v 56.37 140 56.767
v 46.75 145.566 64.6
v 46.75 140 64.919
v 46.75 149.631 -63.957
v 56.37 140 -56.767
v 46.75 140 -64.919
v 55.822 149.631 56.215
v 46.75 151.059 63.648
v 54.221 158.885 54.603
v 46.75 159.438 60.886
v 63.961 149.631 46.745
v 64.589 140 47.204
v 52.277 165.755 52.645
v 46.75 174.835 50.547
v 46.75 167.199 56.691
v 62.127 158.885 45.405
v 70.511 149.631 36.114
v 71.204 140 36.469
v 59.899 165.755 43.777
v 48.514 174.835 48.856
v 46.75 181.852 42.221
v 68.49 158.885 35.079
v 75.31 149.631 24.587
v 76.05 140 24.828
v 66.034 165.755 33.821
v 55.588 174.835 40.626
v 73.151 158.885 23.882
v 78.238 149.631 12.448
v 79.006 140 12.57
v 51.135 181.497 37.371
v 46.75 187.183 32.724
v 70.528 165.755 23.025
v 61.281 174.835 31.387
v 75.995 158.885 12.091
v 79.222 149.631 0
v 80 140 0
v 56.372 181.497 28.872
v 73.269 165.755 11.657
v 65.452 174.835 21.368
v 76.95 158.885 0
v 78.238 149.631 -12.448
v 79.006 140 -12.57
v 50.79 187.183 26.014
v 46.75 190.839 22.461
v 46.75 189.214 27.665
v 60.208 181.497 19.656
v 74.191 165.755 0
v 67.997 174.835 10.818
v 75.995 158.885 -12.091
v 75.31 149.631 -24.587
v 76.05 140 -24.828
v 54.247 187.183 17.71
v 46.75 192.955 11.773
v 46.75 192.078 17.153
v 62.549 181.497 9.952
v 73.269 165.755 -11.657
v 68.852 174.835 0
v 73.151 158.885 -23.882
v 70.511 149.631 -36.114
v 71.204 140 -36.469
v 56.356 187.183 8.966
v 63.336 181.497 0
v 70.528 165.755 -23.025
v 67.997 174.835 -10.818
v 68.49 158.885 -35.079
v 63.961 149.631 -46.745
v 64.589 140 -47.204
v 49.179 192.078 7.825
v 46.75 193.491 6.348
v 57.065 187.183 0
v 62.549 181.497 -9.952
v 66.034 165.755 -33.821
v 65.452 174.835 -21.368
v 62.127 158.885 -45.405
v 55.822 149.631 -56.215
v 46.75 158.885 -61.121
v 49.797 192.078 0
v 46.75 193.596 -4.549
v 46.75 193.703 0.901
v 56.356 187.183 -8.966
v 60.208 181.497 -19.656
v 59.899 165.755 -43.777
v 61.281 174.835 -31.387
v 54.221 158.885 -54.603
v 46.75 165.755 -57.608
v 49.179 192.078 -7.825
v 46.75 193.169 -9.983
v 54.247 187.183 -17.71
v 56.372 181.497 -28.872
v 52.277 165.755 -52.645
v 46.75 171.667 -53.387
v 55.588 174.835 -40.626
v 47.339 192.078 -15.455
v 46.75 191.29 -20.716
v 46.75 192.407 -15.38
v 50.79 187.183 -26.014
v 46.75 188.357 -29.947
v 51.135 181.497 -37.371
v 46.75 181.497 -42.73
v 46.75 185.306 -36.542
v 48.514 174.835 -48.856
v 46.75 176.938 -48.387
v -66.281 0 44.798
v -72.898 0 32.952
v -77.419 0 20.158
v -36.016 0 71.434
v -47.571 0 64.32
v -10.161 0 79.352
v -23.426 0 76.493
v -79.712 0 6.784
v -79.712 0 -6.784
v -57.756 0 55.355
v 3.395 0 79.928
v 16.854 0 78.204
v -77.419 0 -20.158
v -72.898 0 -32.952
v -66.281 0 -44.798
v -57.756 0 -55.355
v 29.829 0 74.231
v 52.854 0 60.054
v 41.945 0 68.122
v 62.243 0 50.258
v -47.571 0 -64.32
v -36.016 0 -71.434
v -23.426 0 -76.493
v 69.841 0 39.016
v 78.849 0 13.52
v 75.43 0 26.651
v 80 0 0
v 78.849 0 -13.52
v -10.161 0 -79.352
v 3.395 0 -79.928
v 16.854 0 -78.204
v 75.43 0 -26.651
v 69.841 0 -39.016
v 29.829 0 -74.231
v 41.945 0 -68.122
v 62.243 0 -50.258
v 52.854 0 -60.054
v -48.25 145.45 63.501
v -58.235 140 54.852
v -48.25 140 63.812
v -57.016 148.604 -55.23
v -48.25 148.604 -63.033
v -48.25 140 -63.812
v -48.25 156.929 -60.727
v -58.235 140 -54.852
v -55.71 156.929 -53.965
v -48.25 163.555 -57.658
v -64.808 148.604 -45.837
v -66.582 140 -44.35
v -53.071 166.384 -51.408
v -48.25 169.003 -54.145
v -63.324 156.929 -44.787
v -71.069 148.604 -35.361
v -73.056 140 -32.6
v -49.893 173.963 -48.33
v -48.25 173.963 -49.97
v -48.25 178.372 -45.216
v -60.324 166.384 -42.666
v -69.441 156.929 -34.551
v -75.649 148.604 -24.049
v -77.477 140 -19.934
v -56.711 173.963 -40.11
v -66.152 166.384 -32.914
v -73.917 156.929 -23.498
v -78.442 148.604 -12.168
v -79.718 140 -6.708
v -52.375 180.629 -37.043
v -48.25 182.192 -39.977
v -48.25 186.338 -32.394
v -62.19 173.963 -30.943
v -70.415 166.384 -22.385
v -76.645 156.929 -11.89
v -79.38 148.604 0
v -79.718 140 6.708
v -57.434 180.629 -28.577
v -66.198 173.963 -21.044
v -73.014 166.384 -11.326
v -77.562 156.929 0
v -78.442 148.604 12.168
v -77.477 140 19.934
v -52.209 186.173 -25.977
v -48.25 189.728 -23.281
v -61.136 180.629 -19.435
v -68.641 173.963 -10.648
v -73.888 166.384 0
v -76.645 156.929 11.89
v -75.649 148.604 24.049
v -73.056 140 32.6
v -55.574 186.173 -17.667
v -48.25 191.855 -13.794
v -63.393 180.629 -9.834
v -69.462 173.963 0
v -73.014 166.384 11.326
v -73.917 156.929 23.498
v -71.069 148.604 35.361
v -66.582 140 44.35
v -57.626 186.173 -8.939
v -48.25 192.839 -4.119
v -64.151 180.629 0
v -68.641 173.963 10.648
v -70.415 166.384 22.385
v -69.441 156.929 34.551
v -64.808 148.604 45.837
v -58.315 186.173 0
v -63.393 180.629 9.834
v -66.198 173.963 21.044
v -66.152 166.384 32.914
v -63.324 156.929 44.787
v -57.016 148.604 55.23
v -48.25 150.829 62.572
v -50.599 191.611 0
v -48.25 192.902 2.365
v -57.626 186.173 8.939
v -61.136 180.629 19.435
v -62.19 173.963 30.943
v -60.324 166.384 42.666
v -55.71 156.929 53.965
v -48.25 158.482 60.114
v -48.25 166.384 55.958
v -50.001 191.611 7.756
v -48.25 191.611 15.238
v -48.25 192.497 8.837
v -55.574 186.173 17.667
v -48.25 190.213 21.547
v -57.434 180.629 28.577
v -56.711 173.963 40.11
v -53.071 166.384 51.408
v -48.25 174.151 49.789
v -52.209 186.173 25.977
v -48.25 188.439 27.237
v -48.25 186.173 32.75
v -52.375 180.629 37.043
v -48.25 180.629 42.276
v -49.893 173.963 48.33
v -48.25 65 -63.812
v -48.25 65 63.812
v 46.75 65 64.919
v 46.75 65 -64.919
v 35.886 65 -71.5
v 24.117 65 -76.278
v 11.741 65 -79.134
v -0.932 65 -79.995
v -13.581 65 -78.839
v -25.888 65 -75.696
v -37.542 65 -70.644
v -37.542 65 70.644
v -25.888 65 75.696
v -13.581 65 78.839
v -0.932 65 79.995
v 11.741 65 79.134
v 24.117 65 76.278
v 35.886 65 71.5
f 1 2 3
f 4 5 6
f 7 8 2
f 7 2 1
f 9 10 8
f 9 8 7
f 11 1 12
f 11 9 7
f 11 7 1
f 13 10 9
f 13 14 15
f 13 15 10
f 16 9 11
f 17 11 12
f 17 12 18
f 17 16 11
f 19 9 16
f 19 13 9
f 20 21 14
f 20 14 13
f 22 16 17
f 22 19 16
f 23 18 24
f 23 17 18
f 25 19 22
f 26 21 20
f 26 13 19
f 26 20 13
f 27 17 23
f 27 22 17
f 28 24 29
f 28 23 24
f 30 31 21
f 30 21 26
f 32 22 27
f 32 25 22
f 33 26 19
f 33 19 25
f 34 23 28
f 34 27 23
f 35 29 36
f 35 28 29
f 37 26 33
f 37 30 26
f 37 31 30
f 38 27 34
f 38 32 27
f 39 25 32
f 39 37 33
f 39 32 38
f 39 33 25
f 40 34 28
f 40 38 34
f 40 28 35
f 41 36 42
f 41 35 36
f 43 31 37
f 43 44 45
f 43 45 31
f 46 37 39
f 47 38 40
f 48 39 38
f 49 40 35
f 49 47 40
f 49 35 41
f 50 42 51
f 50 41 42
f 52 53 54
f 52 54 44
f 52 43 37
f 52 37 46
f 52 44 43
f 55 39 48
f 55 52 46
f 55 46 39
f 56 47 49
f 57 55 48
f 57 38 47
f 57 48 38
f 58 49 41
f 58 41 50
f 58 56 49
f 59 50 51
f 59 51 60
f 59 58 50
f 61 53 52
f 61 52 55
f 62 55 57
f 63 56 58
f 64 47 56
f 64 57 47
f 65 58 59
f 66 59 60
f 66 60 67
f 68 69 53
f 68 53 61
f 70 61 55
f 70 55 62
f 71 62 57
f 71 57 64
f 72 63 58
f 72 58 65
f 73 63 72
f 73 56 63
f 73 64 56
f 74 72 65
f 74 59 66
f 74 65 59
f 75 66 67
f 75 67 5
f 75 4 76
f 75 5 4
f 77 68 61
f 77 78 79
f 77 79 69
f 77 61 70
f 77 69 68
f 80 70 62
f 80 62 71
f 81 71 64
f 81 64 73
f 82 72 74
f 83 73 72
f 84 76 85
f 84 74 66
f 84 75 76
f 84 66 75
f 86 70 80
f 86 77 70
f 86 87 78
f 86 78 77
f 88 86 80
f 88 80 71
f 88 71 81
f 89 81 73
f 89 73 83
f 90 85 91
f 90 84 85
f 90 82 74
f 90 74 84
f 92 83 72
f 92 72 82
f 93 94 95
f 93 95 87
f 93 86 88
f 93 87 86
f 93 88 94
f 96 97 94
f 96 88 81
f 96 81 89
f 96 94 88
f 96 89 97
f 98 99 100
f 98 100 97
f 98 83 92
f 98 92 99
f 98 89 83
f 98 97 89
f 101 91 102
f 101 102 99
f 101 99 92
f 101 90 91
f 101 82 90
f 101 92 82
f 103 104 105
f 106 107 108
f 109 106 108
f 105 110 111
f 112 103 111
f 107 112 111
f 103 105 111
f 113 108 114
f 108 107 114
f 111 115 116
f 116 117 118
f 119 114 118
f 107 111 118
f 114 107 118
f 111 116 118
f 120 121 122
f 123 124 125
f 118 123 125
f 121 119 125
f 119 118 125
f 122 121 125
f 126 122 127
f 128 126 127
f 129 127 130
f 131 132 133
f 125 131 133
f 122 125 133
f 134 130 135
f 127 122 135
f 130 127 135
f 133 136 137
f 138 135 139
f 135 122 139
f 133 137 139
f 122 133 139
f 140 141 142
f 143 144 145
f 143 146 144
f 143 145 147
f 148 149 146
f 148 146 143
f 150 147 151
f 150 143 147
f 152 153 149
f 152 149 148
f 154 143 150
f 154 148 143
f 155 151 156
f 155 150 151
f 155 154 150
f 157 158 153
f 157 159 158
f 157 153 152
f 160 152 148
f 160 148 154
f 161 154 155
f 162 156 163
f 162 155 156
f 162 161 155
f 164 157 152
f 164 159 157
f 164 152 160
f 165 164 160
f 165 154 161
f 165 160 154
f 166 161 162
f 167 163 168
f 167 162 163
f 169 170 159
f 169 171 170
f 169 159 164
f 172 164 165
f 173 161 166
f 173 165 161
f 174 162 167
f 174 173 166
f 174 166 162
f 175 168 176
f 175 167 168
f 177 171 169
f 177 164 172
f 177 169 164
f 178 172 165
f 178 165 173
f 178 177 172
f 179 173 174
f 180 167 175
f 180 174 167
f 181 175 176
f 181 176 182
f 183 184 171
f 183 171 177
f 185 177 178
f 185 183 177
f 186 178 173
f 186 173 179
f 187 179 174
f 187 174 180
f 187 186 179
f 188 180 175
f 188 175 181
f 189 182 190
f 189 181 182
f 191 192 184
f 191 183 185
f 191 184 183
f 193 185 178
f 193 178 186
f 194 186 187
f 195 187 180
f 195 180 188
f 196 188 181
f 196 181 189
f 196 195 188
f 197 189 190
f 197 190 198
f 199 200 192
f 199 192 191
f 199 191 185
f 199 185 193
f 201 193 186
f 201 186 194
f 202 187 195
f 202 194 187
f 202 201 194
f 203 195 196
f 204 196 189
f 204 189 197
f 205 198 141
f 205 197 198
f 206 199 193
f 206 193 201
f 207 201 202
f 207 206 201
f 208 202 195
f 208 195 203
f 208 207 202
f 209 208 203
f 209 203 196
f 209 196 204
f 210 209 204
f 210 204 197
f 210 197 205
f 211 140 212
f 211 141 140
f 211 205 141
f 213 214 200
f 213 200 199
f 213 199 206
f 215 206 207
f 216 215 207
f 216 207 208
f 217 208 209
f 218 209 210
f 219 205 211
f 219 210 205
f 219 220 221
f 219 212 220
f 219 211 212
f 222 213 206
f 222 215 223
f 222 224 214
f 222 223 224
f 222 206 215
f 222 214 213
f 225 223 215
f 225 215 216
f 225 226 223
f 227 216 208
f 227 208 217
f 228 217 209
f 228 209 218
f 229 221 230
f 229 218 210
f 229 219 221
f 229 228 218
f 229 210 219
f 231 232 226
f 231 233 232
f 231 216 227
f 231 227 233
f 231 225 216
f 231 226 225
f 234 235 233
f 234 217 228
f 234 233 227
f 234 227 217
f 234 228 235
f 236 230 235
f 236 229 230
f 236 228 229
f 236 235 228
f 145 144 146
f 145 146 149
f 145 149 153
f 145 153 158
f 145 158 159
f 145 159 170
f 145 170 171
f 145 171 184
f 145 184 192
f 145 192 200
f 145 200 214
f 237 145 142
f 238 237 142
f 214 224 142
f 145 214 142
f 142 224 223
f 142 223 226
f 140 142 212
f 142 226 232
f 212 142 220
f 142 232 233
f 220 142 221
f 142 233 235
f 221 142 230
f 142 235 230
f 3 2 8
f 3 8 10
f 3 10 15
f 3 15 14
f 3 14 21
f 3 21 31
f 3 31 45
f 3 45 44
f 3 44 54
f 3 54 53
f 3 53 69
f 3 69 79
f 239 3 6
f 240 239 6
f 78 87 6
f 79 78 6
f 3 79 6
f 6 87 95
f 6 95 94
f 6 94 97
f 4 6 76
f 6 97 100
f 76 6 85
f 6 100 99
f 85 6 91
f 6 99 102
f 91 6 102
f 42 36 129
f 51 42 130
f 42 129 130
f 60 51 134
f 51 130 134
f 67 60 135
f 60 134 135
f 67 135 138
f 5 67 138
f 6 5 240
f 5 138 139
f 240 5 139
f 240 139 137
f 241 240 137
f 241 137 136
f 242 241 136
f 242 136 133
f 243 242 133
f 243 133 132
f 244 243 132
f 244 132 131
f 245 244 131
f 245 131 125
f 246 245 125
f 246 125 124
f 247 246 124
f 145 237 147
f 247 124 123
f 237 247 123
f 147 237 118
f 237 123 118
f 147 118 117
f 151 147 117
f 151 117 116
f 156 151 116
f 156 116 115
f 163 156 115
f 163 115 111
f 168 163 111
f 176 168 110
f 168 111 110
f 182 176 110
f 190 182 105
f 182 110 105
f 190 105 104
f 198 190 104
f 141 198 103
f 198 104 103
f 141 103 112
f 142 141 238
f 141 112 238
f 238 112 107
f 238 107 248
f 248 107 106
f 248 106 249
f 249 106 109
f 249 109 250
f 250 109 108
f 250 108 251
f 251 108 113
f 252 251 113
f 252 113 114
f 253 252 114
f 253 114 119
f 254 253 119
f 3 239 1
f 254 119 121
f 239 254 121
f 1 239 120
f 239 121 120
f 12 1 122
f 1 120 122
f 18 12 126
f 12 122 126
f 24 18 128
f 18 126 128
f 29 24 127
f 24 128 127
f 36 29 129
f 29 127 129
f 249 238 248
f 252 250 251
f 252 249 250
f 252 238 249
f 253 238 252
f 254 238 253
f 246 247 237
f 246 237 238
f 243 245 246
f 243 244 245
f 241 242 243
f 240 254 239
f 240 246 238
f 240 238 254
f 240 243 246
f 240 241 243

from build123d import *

# Parameters (mm, degrees)
SZKIC2_R                    = 80
DODANIE_WYCI_GNI_CIE2_DEPTH = 200
ZAOKR_GLENIE1_R             = 60
WYTNIJ_WYCI_GNI_CIE1_DEPTH  = 135


with BuildPart() as part:
    # Szkic2 → Dodanie-wyciągnięcie2 (new body)
    with BuildSketch(Plane(origin=(0, 0, 0), x_dir=(1, 0, 0), z_dir=(0, 1, 0))):
        Circle(SZKIC2_R)
    extrude(amount=DODANIE_WYCI_GNI_CIE2_DEPTH)

    # Zaokrąglenie1
    zaokr_glenie1_edges = [part.edges().sort_by_distance(p)[0] for p in [
        (-80, 200, 0),
    ]]
    fillet(zaokr_glenie1_edges, radius=ZAOKR_GLENIE1_R)

    # Szkic5 → Wytnij-wyciągnięcie1 (cut)
    with BuildSketch(Plane(origin=(0, 200, 0), x_dir=(1, 0, 0), z_dir=(0, 1, 0))):
        Polygon((46.75, 0), (46.75, 80.000117874), (-48.25, 80.000117874), (-48.25, 0), (-48.25, -80.000327), (46.75, -80.000327), align=None)
    extrude(amount=-WYTNIJ_WYCI_GNI_CIE1_DEPTH, mode=Mode.SUBTRACT)


solid = part.part
